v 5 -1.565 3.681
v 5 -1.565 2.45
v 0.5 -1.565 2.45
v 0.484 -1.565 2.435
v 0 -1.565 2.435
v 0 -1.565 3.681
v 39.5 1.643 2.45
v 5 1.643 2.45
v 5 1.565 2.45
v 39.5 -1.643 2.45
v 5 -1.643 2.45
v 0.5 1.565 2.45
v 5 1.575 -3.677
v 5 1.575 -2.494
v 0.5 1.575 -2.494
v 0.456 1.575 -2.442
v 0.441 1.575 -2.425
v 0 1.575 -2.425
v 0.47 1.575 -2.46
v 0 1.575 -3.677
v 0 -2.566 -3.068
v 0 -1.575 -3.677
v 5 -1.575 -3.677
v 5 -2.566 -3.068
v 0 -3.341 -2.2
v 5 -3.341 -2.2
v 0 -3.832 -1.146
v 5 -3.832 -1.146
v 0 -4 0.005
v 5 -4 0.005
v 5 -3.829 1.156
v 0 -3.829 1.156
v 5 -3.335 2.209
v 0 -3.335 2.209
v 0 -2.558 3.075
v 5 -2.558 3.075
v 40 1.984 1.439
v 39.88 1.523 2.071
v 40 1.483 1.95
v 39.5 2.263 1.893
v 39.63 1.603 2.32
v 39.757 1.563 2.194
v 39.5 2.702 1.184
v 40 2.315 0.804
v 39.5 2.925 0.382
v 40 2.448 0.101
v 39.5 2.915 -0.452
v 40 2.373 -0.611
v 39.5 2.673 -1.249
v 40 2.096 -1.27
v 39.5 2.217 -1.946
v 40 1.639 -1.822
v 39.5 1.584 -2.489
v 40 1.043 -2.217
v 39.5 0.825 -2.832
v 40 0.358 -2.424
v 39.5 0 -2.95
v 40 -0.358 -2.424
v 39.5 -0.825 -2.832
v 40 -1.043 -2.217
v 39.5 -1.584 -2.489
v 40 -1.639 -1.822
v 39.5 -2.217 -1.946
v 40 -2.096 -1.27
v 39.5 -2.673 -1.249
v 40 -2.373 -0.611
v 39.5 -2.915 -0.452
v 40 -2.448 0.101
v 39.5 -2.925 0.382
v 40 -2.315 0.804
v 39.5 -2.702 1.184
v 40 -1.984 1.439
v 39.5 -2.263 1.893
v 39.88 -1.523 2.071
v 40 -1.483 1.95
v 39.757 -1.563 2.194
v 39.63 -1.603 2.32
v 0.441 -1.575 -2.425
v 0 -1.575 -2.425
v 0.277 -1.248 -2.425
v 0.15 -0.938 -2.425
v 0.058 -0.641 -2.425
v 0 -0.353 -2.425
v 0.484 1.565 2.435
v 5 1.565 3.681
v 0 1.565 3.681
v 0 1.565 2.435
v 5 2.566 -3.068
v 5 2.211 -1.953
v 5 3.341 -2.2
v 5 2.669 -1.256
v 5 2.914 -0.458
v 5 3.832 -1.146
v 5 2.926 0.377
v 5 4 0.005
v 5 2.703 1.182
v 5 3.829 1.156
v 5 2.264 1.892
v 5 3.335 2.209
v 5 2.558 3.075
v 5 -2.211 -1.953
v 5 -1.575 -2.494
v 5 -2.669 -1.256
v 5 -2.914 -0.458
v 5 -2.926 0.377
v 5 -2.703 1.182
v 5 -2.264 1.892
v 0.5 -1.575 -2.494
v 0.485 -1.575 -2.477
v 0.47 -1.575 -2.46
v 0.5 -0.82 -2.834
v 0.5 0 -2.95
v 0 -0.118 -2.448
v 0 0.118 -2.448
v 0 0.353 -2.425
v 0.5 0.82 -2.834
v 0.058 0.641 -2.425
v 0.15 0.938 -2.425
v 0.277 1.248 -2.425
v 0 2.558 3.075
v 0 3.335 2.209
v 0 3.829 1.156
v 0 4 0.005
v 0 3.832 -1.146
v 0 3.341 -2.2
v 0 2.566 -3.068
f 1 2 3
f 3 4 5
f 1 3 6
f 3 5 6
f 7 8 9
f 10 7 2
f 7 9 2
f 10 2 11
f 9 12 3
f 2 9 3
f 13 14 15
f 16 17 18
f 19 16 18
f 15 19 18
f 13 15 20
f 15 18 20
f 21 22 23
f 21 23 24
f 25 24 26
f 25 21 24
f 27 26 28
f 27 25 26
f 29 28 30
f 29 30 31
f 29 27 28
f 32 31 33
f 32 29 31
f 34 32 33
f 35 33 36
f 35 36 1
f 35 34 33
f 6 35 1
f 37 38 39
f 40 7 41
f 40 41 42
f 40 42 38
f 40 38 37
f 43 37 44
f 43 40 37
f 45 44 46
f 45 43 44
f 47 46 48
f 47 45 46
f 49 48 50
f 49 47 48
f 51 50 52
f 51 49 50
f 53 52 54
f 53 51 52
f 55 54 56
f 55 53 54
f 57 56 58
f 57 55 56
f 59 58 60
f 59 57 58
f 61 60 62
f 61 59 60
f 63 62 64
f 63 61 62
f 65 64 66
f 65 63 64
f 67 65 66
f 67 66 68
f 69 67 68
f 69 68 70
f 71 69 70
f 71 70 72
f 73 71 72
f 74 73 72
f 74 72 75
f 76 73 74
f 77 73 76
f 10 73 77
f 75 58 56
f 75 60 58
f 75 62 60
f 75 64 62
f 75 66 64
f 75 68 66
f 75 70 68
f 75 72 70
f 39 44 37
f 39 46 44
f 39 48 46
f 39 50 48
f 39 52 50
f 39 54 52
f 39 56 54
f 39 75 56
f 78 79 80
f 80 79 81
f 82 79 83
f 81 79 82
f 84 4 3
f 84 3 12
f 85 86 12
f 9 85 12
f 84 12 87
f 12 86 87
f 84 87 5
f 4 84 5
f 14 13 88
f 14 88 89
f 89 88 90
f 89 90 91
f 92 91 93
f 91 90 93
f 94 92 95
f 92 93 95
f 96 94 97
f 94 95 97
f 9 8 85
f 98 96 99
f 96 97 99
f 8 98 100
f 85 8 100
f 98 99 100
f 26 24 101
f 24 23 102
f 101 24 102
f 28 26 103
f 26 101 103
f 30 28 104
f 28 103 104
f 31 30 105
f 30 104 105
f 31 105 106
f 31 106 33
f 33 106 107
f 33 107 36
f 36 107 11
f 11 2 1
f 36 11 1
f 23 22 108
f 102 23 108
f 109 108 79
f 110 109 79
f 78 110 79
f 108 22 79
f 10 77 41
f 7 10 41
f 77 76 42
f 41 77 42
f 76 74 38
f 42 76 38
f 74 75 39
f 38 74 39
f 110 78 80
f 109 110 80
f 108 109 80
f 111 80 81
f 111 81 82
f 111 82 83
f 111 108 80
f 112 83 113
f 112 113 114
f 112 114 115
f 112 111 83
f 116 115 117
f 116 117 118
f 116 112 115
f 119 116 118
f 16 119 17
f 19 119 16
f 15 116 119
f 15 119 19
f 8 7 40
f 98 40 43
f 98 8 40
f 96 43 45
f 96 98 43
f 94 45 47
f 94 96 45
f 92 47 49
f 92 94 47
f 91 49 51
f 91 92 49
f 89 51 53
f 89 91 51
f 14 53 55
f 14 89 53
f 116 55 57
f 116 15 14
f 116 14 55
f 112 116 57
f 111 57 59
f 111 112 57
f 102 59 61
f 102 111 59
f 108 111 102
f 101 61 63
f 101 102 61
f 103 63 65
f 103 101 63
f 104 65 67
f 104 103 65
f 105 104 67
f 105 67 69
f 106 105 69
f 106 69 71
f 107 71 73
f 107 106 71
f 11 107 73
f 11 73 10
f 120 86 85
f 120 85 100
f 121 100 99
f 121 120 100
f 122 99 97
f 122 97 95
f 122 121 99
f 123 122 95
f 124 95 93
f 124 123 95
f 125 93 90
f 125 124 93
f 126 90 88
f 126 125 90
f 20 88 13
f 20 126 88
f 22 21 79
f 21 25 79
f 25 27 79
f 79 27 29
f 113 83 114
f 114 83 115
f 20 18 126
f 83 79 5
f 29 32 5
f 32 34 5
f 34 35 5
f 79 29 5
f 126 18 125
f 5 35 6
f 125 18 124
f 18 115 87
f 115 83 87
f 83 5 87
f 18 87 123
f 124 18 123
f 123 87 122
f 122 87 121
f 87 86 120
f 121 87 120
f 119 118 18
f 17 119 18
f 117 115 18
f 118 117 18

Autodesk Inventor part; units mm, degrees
ref_plane "YZ Plane" through (0, 0, 0) normal (1, 0, 0) x (0, 1, 0)
ref_plane "XZ Plane" through (0, 0, 0) normal (0, 1, 0) x (-1, 0, 0)
ref_plane "XY Plane" through (0, 0, 0) normal (0, 0, 1) x (1, 0, 0)
sketch "Sketch1" plane through (0, 0, 0) normal (1, 0, 0) x (0, 1, 0)
  circle A0 centre (0, 0) radius 2.95
  line L0 (1.6432, 2.45) -> (-1.6432, 2.45)
  dimension "d0" = 5.9
  dimension "d1" = 0.5
extrude "Extrusion1" add sketch "Sketch1" along normal blind 40 contours A0 L0 picked at (0.5577, 0.5097)
chamfer "Chamfer1" distance 0.5 angle 45 4 edges at (0, 0, -2.95) (0, 0, 2.45) (40, 0, -2.95) (40, 0, 2.45)
sketch "Sketch2" plane through (0, 0, 0) normal (-1, 0, 0) x (0, 0, 1)
  circle A0 centre (0, 0) radius 3
  circle A1 centre (0, 0) radius 4
  line L0 (5.565, 1.565) -> (2.435, 1.565)
  line L1 (2.435, 1.565) -> (2.435, -1.565)
  line L2 (2.435, -1.565) -> (5.565, -1.565)
  line L3 (5.565, -1.565) -> (5.565, 1.565)
  line L4 (5.565, 1.565) -> (2.435, -1.565) construction
  line L5 (2.435, 1.565) -> (5.565, -1.565) construction
  line L6 (-2.425, 1.575) -> (-5.575, 1.575)
  line L7 (-5.575, 1.575) -> (-5.575, -1.575)
  line L8 (-5.575, -1.575) -> (-2.425, -1.575)
  line L9 (-2.425, -1.575) -> (-2.425, 1.575)
  line L10 (-2.425, 1.575) -> (-5.575, -1.575) construction
  line L11 (-5.575, 1.575) -> (-2.425, -1.575) construction
  point P0 (4, 0)
  point P1 (-4, 0)
  point P2 (-3.6769, 1.575)
  point P3 (-3.6769, -1.575)
  point P4 (3.6811, -1.565)
  point P5 (3.6811, 1.565)
  dimension "d7" = 3.13
  dimension "d8" = 3.13
  dimension "d9" = 3.15
  dimension "d10" = 3.15
extrude "Extrusion2" add sketch "Sketch2" against normal blind 5 contours L0 L1 L2 A0 L8 L9 L6 | A0 L6 A1 L0 | L2 A1 L8 A0
properties part number "Ø6x40Shaft"
